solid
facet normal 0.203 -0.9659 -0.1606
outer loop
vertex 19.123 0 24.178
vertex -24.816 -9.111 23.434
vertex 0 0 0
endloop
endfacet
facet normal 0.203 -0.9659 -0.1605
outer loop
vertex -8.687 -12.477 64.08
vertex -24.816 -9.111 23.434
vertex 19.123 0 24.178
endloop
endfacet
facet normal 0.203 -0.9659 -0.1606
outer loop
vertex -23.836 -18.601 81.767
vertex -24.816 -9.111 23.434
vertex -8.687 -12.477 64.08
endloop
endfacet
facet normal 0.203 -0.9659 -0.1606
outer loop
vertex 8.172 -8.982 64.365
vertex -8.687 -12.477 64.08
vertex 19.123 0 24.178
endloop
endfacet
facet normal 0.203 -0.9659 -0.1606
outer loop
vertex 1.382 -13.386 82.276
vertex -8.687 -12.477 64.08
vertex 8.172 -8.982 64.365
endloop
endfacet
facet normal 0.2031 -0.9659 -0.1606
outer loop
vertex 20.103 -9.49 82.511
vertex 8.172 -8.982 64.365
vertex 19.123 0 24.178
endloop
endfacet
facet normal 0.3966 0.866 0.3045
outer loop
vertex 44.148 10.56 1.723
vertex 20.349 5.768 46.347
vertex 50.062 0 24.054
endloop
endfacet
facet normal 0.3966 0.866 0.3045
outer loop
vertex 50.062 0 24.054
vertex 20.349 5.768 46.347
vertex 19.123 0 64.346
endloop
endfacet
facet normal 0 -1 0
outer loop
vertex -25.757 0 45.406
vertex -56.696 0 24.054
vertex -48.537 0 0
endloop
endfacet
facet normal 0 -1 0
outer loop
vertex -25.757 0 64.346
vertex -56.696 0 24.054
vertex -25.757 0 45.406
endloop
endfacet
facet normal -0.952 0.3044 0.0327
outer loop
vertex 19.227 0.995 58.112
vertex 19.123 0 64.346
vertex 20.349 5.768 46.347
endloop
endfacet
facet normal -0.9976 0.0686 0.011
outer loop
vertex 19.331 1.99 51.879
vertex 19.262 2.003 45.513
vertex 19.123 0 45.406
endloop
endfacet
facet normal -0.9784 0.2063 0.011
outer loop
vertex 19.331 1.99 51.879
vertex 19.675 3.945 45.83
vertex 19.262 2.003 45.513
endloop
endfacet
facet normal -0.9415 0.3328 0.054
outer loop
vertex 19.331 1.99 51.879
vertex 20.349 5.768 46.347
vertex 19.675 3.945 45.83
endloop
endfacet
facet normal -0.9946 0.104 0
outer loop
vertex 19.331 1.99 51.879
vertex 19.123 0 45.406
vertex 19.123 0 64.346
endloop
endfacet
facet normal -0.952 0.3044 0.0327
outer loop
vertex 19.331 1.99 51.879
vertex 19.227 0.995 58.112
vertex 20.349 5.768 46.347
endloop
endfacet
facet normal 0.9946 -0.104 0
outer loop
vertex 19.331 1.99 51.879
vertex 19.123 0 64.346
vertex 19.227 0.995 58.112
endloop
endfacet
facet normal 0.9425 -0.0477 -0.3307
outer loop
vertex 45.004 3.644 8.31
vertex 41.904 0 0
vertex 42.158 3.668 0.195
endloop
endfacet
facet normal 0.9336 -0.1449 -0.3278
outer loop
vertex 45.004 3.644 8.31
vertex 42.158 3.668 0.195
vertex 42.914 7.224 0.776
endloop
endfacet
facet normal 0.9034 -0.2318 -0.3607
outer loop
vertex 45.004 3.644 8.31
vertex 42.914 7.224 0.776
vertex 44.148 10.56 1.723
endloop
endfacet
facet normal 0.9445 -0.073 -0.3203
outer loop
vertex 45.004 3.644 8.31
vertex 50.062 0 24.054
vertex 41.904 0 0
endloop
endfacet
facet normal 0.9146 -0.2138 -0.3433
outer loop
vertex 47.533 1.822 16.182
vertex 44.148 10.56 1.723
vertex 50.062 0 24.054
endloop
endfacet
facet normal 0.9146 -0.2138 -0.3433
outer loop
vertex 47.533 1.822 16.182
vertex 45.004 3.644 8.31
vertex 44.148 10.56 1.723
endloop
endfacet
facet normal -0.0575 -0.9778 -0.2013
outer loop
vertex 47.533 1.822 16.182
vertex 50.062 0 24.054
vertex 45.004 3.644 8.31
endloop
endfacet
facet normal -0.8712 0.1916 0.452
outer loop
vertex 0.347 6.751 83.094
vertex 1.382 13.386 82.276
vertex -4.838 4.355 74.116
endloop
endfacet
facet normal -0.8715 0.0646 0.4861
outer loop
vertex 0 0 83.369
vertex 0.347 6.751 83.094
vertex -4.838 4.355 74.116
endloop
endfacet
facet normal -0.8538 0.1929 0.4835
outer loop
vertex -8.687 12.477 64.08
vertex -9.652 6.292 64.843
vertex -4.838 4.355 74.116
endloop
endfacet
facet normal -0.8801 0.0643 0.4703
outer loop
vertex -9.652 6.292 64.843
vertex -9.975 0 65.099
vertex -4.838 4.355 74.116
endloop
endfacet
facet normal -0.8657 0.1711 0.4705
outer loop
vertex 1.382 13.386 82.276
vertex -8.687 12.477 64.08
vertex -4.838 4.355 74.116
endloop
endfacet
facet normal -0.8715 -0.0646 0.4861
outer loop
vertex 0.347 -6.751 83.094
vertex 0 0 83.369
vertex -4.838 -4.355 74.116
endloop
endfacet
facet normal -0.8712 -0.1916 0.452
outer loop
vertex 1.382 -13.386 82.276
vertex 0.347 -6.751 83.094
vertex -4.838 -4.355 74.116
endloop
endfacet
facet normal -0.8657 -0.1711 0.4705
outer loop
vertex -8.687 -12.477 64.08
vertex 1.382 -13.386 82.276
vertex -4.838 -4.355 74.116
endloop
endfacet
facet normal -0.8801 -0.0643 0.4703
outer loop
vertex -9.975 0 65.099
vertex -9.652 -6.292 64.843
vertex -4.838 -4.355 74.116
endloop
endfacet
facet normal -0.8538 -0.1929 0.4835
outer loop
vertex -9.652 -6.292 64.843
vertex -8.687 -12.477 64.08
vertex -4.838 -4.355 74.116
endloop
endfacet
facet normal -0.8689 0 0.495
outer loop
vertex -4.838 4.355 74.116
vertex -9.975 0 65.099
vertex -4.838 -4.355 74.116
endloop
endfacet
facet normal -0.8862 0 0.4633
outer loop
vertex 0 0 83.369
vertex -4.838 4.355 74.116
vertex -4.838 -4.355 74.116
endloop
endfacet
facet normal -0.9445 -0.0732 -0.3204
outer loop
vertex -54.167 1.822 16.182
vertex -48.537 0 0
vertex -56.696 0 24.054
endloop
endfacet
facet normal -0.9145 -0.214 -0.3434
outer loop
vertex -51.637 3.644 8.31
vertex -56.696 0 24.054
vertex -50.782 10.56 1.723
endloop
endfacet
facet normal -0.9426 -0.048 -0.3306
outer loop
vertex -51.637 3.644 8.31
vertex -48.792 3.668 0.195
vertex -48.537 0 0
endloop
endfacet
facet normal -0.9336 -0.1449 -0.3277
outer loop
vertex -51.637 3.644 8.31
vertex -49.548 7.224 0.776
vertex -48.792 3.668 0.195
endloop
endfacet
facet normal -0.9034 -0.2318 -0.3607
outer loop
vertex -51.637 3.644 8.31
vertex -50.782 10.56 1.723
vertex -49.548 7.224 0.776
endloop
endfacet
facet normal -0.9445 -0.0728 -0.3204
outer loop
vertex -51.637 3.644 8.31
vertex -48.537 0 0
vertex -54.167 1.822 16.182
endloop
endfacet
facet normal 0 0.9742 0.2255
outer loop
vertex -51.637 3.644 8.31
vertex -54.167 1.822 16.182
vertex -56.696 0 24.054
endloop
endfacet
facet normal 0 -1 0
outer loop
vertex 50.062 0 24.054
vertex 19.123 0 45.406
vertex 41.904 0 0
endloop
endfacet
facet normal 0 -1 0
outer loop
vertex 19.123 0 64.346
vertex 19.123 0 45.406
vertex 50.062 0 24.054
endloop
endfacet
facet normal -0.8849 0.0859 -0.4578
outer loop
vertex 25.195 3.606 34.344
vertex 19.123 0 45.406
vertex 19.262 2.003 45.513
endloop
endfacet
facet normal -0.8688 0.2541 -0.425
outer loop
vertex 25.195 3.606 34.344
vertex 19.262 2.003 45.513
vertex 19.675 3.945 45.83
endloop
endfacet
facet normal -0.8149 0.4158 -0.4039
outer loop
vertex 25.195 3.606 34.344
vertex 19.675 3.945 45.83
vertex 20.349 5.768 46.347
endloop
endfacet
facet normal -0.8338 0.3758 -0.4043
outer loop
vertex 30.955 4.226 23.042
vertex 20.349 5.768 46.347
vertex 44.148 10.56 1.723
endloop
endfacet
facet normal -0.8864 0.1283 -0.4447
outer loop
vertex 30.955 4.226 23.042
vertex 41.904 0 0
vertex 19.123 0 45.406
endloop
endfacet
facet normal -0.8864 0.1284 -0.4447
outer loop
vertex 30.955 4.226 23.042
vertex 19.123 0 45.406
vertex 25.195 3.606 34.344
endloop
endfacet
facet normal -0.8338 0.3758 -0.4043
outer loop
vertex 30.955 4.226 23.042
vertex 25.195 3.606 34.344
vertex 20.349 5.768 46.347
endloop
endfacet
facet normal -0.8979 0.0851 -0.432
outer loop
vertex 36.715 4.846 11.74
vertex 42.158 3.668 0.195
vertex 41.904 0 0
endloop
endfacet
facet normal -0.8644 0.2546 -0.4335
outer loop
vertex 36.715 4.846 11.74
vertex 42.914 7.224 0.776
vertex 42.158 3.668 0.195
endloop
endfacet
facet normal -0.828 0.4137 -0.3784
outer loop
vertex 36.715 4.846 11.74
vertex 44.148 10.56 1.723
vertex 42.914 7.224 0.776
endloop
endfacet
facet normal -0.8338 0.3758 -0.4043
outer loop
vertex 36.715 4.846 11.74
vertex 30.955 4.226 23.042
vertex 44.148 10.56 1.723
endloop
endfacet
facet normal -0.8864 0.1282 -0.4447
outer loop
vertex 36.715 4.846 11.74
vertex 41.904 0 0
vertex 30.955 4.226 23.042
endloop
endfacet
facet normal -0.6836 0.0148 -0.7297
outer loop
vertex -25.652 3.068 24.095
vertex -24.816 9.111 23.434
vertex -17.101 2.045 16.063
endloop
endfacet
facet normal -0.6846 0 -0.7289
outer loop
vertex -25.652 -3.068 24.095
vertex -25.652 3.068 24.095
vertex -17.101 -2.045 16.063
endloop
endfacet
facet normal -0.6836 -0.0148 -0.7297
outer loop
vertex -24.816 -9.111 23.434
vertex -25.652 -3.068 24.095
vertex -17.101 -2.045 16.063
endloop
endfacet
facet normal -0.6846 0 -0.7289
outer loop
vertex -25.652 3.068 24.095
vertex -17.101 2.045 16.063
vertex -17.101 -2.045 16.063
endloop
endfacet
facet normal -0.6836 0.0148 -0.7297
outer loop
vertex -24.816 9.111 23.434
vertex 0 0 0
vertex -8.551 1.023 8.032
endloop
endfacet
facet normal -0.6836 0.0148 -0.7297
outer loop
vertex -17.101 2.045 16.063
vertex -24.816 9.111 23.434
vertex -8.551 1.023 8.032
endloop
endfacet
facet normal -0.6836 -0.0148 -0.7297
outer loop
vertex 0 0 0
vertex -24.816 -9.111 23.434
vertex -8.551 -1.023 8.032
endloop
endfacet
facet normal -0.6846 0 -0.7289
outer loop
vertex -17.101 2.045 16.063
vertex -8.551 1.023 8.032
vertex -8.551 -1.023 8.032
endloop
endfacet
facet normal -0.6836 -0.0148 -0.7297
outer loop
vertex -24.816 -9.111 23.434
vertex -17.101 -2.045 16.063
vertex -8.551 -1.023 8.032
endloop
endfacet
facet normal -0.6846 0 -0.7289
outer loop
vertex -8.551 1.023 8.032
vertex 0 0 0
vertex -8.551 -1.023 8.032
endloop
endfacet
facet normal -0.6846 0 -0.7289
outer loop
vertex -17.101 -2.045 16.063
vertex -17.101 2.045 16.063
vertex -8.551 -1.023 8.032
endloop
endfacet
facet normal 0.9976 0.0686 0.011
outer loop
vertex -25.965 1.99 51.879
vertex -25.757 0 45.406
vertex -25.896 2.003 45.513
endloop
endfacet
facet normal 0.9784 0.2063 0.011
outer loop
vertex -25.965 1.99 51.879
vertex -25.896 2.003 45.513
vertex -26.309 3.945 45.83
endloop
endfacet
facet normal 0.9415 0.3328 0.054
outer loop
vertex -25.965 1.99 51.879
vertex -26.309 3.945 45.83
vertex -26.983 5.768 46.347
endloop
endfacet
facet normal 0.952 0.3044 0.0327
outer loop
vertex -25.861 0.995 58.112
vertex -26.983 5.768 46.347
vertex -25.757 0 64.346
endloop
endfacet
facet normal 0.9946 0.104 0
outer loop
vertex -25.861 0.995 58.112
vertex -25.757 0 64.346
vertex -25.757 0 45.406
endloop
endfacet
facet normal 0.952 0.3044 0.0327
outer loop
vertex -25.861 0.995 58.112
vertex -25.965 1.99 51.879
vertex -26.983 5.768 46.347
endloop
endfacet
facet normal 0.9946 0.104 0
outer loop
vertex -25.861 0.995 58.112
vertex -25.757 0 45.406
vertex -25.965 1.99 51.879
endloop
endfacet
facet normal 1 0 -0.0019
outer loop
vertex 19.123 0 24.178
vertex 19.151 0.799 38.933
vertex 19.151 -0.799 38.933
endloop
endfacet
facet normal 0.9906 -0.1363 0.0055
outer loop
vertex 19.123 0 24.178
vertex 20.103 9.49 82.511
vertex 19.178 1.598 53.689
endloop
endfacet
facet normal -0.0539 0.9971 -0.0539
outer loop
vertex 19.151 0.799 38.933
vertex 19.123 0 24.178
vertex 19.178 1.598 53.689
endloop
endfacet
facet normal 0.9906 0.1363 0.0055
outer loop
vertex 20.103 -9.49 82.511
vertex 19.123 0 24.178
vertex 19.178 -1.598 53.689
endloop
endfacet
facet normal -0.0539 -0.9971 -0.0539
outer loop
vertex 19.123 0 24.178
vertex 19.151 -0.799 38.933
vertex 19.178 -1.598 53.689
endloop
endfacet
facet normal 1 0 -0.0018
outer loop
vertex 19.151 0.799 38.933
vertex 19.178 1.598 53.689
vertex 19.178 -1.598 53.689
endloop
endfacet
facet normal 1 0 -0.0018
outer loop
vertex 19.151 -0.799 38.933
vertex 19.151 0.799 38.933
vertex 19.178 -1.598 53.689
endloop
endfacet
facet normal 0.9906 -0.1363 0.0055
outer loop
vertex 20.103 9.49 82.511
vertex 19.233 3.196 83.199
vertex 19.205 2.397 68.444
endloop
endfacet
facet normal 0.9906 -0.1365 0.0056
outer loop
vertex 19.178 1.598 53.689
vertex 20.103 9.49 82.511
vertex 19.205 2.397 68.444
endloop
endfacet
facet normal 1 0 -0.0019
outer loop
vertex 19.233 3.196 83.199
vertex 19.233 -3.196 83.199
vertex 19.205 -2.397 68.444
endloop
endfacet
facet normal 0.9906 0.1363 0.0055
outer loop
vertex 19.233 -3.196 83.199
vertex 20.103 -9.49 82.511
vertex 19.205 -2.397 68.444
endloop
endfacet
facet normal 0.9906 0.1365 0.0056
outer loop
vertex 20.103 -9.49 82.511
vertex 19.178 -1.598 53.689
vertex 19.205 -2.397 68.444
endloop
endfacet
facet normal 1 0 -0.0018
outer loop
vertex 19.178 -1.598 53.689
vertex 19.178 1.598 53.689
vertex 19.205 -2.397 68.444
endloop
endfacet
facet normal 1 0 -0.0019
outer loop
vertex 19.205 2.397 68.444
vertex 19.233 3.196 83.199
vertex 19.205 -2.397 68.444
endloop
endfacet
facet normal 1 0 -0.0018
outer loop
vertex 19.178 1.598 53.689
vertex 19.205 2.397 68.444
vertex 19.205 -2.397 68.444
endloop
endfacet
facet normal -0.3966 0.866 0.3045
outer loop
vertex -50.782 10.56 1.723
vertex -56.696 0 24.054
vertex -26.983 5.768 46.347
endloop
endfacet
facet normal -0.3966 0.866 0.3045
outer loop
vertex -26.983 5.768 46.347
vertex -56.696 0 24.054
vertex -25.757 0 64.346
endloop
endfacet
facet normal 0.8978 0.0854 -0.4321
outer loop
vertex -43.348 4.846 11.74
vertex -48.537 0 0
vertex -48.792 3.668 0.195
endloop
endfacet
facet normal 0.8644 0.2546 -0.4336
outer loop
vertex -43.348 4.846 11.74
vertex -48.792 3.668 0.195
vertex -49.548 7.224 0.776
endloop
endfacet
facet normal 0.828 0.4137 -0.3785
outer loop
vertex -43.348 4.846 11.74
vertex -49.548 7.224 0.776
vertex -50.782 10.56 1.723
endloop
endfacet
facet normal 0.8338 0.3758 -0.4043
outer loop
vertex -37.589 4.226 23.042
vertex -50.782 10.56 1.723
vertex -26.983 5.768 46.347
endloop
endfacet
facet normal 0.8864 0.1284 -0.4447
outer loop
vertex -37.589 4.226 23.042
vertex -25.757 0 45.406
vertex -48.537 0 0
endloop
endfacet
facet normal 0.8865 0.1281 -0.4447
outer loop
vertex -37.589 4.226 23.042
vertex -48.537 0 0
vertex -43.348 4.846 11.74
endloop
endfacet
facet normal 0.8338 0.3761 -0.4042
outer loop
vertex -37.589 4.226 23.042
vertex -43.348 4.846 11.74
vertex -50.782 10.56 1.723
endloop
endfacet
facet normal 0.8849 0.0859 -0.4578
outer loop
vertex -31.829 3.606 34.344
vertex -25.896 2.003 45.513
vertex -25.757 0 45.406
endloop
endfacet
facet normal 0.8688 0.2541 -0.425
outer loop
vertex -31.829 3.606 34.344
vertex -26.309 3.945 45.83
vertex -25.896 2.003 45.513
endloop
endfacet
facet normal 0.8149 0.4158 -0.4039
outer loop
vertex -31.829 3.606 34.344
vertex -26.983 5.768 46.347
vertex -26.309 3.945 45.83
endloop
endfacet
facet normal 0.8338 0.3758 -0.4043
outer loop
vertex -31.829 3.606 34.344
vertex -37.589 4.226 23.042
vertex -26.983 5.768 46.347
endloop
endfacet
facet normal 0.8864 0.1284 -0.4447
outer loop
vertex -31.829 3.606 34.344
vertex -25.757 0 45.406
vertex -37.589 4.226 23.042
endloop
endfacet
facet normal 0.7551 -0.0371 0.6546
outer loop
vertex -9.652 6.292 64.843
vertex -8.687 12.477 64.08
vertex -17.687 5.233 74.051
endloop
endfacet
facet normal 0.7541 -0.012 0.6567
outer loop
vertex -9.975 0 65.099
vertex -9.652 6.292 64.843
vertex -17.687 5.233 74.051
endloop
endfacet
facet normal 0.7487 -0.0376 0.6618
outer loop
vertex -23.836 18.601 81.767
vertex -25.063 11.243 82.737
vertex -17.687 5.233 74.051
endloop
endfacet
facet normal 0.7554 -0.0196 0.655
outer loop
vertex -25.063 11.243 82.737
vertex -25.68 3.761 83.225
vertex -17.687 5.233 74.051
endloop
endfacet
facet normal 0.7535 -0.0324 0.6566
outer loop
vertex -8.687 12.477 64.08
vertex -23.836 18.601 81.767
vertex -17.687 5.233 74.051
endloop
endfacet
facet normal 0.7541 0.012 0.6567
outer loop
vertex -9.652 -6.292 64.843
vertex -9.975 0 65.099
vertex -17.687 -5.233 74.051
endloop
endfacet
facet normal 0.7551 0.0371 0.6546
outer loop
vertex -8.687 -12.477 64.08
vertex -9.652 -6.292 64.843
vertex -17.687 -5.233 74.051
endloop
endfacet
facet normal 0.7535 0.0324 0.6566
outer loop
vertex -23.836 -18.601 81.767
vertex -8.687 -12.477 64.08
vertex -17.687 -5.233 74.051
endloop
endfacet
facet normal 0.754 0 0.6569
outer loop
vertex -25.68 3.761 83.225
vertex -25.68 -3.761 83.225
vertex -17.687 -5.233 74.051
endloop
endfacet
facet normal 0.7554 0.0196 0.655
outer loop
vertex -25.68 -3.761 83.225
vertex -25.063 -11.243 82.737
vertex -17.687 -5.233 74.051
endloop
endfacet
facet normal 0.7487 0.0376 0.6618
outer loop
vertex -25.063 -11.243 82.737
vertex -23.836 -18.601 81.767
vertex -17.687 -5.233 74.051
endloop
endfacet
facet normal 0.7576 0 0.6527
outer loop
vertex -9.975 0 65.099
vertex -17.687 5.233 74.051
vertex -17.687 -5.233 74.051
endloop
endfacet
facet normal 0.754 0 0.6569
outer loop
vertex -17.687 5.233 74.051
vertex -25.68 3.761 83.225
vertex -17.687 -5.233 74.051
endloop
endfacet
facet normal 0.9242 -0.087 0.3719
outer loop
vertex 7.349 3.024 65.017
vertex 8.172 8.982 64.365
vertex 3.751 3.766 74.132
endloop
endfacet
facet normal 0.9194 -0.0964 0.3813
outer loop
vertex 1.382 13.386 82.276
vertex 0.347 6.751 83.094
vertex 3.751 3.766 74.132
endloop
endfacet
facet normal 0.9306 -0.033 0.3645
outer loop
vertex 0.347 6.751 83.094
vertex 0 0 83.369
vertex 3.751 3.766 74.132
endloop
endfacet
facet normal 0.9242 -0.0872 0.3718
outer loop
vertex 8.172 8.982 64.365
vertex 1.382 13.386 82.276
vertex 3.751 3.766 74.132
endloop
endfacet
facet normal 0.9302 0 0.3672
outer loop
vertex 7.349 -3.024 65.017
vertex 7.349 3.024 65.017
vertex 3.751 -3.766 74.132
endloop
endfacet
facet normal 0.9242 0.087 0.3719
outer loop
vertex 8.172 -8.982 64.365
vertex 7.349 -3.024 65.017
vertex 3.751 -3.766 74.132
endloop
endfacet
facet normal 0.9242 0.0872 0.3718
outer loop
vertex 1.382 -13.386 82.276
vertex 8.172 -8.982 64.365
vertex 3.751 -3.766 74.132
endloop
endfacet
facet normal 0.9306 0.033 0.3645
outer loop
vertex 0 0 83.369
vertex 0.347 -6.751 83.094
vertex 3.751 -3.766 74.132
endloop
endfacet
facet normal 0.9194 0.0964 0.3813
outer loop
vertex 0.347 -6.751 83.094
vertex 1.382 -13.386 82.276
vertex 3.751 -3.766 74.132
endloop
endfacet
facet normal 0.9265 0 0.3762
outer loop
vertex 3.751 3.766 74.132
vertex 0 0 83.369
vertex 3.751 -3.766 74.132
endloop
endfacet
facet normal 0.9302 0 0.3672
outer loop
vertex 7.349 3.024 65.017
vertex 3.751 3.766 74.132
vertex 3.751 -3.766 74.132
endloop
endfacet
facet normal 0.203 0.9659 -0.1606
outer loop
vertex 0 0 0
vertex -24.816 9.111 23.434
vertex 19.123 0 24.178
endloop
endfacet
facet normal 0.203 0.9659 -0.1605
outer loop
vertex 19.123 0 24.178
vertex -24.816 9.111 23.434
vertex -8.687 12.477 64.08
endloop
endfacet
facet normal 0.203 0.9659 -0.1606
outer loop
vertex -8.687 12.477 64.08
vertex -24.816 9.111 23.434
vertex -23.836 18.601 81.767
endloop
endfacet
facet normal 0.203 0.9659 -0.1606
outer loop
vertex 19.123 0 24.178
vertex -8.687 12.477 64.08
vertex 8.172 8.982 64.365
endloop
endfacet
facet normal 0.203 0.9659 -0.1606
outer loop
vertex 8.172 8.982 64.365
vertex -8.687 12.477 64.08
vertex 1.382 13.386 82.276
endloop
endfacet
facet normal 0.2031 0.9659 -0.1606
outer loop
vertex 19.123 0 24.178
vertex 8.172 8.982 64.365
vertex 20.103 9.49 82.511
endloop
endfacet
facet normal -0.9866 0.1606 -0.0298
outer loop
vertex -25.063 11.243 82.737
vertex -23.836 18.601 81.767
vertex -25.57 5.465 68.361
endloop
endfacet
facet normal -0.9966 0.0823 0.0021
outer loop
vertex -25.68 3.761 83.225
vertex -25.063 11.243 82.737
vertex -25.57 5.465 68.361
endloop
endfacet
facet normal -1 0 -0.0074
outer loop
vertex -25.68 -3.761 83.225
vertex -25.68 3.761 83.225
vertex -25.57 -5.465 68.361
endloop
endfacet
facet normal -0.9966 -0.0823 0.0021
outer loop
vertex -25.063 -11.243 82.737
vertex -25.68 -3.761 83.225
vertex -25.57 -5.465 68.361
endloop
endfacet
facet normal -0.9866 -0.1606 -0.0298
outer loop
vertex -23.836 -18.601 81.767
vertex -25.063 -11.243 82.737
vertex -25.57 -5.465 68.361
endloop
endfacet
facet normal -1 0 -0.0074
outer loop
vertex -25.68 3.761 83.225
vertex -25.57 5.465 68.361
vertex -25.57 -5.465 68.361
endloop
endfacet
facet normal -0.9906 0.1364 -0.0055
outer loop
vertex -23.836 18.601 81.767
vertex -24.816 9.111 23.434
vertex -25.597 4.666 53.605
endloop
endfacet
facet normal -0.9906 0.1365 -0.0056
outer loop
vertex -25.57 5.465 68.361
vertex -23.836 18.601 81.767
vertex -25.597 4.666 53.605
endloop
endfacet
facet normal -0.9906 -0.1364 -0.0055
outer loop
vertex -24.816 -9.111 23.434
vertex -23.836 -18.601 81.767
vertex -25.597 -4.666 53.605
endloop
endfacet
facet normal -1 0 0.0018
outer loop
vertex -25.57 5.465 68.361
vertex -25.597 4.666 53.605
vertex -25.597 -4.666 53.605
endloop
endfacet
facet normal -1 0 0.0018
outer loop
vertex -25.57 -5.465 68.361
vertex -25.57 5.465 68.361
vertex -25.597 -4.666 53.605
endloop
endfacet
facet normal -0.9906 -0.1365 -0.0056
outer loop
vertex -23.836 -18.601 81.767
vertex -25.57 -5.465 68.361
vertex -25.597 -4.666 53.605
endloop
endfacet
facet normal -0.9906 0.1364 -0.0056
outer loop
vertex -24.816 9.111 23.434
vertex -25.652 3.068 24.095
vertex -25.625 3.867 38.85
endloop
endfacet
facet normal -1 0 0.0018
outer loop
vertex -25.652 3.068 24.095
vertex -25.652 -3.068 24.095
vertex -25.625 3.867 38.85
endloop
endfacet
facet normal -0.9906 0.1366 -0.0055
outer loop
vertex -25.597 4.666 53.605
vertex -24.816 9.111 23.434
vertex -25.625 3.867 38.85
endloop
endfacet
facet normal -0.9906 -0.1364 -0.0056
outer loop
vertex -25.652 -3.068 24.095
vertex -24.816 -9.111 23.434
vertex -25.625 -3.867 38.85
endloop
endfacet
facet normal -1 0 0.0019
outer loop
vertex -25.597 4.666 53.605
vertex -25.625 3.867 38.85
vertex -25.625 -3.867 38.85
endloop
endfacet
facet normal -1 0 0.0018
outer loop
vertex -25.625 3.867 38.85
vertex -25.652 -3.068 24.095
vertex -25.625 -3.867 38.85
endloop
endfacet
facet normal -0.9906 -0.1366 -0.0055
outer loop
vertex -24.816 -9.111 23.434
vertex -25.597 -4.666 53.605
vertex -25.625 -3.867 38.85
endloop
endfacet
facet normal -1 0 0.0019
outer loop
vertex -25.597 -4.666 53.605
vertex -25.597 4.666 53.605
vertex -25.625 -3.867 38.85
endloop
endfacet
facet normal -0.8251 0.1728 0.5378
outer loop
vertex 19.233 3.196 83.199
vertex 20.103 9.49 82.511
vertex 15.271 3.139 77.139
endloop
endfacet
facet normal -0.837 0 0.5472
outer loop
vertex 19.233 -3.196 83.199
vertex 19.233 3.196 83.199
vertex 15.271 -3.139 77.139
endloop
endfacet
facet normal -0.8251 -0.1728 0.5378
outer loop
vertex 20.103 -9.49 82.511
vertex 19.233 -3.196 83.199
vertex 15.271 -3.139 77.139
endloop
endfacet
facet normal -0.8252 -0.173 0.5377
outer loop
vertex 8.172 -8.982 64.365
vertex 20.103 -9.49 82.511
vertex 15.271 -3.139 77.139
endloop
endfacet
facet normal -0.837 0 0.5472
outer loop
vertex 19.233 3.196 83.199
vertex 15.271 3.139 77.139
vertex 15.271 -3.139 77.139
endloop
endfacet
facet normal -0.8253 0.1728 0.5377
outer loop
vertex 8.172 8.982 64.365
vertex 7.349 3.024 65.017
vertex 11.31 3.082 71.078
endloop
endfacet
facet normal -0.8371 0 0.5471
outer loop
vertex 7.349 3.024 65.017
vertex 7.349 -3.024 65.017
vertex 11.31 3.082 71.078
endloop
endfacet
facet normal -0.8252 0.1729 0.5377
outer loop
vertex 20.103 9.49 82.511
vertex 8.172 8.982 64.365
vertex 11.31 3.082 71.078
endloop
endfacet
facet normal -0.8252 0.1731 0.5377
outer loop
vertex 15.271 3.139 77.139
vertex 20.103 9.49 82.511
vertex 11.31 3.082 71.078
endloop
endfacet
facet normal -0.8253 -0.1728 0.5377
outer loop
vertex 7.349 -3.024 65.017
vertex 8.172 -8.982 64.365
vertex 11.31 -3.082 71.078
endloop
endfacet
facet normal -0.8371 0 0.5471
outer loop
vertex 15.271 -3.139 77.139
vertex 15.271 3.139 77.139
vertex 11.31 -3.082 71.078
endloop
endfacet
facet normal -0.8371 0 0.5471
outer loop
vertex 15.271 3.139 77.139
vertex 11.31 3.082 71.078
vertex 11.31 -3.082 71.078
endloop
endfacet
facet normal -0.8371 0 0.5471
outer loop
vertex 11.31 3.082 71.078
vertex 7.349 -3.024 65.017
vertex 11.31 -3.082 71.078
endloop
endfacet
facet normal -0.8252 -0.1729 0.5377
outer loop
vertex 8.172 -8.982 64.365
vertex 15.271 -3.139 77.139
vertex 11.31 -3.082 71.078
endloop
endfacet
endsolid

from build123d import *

# Parameters (mm, degrees)
F1_ANGLE_BACK = 15
F1_ANGLE      = 30
F2_ANGLE      = 30
F3_ANGLE      = 30


with BuildPart() as f1:
    # F0 (on Front) → F1 (revolve)
    with BuildSketch(Plane.XZ, mode=Mode.PRIVATE) as f1_sk:
        Polygon((-25.7571255401, 24.1777971488), (0, 0), (19.1233232134, 24.1777971488), (19.1233232134, 45.4059700859), (19.1233232134, 64.3459617069), (19.1233232134, 83.2859533279), (7.2450009175, 65.0988072157), (0, 83.3688080311), (-9.9750002846, 65.0988072157), (-25.7571255401, 83.2859533279), (-25.7571255401, 64.3459617069), (-25.7571255401, 45.4059700859), align=None)
    revolve(f1_sk.sketch.rotate(Axis((9.5616616067, 0, 12.0888985744), (0.6203552442, 0, 0.7843209617)), -F1_ANGLE_BACK), axis=Axis((9.5616616067, 0, 12.0888985744), (0.6203552442, 0, 0.7843209617)), revolution_arc=F1_ANGLE)


with BuildPart() as f2:
    # F0 (on Front) → F2 (revolve)
    with BuildSketch(Plane.XZ):
        Polygon((19.1233232134, 64.3459617069), (19.1233232134, 45.4059700859), (41.9035313019, 0), (50.0620402672, 24.0540793102), align=None)
    revolve(axis=Axis((34.5926817403, 0, 44.2000205086), (0.6090298633, 0, -0.7931472913)), revolution_arc=F2_ANGLE)


with BuildPart() as f3:
    # F0 (on Front) → F3 (revolve)
    with BuildSketch(Plane.XZ):
        Polygon((-48.5373336286, 0), (-25.7571255401, 45.4059700859), (-25.7571255401, 64.3459617069), (-56.6958425939, 24.0540793102), align=None)
    revolve(axis=Axis((-41.226484067, 0, 44.2000205086), (0.6090298633, 0, 0.7931472913)), revolution_arc=F3_ANGLE)


solid = Compound([f1.part, f2.part, f3.part])
